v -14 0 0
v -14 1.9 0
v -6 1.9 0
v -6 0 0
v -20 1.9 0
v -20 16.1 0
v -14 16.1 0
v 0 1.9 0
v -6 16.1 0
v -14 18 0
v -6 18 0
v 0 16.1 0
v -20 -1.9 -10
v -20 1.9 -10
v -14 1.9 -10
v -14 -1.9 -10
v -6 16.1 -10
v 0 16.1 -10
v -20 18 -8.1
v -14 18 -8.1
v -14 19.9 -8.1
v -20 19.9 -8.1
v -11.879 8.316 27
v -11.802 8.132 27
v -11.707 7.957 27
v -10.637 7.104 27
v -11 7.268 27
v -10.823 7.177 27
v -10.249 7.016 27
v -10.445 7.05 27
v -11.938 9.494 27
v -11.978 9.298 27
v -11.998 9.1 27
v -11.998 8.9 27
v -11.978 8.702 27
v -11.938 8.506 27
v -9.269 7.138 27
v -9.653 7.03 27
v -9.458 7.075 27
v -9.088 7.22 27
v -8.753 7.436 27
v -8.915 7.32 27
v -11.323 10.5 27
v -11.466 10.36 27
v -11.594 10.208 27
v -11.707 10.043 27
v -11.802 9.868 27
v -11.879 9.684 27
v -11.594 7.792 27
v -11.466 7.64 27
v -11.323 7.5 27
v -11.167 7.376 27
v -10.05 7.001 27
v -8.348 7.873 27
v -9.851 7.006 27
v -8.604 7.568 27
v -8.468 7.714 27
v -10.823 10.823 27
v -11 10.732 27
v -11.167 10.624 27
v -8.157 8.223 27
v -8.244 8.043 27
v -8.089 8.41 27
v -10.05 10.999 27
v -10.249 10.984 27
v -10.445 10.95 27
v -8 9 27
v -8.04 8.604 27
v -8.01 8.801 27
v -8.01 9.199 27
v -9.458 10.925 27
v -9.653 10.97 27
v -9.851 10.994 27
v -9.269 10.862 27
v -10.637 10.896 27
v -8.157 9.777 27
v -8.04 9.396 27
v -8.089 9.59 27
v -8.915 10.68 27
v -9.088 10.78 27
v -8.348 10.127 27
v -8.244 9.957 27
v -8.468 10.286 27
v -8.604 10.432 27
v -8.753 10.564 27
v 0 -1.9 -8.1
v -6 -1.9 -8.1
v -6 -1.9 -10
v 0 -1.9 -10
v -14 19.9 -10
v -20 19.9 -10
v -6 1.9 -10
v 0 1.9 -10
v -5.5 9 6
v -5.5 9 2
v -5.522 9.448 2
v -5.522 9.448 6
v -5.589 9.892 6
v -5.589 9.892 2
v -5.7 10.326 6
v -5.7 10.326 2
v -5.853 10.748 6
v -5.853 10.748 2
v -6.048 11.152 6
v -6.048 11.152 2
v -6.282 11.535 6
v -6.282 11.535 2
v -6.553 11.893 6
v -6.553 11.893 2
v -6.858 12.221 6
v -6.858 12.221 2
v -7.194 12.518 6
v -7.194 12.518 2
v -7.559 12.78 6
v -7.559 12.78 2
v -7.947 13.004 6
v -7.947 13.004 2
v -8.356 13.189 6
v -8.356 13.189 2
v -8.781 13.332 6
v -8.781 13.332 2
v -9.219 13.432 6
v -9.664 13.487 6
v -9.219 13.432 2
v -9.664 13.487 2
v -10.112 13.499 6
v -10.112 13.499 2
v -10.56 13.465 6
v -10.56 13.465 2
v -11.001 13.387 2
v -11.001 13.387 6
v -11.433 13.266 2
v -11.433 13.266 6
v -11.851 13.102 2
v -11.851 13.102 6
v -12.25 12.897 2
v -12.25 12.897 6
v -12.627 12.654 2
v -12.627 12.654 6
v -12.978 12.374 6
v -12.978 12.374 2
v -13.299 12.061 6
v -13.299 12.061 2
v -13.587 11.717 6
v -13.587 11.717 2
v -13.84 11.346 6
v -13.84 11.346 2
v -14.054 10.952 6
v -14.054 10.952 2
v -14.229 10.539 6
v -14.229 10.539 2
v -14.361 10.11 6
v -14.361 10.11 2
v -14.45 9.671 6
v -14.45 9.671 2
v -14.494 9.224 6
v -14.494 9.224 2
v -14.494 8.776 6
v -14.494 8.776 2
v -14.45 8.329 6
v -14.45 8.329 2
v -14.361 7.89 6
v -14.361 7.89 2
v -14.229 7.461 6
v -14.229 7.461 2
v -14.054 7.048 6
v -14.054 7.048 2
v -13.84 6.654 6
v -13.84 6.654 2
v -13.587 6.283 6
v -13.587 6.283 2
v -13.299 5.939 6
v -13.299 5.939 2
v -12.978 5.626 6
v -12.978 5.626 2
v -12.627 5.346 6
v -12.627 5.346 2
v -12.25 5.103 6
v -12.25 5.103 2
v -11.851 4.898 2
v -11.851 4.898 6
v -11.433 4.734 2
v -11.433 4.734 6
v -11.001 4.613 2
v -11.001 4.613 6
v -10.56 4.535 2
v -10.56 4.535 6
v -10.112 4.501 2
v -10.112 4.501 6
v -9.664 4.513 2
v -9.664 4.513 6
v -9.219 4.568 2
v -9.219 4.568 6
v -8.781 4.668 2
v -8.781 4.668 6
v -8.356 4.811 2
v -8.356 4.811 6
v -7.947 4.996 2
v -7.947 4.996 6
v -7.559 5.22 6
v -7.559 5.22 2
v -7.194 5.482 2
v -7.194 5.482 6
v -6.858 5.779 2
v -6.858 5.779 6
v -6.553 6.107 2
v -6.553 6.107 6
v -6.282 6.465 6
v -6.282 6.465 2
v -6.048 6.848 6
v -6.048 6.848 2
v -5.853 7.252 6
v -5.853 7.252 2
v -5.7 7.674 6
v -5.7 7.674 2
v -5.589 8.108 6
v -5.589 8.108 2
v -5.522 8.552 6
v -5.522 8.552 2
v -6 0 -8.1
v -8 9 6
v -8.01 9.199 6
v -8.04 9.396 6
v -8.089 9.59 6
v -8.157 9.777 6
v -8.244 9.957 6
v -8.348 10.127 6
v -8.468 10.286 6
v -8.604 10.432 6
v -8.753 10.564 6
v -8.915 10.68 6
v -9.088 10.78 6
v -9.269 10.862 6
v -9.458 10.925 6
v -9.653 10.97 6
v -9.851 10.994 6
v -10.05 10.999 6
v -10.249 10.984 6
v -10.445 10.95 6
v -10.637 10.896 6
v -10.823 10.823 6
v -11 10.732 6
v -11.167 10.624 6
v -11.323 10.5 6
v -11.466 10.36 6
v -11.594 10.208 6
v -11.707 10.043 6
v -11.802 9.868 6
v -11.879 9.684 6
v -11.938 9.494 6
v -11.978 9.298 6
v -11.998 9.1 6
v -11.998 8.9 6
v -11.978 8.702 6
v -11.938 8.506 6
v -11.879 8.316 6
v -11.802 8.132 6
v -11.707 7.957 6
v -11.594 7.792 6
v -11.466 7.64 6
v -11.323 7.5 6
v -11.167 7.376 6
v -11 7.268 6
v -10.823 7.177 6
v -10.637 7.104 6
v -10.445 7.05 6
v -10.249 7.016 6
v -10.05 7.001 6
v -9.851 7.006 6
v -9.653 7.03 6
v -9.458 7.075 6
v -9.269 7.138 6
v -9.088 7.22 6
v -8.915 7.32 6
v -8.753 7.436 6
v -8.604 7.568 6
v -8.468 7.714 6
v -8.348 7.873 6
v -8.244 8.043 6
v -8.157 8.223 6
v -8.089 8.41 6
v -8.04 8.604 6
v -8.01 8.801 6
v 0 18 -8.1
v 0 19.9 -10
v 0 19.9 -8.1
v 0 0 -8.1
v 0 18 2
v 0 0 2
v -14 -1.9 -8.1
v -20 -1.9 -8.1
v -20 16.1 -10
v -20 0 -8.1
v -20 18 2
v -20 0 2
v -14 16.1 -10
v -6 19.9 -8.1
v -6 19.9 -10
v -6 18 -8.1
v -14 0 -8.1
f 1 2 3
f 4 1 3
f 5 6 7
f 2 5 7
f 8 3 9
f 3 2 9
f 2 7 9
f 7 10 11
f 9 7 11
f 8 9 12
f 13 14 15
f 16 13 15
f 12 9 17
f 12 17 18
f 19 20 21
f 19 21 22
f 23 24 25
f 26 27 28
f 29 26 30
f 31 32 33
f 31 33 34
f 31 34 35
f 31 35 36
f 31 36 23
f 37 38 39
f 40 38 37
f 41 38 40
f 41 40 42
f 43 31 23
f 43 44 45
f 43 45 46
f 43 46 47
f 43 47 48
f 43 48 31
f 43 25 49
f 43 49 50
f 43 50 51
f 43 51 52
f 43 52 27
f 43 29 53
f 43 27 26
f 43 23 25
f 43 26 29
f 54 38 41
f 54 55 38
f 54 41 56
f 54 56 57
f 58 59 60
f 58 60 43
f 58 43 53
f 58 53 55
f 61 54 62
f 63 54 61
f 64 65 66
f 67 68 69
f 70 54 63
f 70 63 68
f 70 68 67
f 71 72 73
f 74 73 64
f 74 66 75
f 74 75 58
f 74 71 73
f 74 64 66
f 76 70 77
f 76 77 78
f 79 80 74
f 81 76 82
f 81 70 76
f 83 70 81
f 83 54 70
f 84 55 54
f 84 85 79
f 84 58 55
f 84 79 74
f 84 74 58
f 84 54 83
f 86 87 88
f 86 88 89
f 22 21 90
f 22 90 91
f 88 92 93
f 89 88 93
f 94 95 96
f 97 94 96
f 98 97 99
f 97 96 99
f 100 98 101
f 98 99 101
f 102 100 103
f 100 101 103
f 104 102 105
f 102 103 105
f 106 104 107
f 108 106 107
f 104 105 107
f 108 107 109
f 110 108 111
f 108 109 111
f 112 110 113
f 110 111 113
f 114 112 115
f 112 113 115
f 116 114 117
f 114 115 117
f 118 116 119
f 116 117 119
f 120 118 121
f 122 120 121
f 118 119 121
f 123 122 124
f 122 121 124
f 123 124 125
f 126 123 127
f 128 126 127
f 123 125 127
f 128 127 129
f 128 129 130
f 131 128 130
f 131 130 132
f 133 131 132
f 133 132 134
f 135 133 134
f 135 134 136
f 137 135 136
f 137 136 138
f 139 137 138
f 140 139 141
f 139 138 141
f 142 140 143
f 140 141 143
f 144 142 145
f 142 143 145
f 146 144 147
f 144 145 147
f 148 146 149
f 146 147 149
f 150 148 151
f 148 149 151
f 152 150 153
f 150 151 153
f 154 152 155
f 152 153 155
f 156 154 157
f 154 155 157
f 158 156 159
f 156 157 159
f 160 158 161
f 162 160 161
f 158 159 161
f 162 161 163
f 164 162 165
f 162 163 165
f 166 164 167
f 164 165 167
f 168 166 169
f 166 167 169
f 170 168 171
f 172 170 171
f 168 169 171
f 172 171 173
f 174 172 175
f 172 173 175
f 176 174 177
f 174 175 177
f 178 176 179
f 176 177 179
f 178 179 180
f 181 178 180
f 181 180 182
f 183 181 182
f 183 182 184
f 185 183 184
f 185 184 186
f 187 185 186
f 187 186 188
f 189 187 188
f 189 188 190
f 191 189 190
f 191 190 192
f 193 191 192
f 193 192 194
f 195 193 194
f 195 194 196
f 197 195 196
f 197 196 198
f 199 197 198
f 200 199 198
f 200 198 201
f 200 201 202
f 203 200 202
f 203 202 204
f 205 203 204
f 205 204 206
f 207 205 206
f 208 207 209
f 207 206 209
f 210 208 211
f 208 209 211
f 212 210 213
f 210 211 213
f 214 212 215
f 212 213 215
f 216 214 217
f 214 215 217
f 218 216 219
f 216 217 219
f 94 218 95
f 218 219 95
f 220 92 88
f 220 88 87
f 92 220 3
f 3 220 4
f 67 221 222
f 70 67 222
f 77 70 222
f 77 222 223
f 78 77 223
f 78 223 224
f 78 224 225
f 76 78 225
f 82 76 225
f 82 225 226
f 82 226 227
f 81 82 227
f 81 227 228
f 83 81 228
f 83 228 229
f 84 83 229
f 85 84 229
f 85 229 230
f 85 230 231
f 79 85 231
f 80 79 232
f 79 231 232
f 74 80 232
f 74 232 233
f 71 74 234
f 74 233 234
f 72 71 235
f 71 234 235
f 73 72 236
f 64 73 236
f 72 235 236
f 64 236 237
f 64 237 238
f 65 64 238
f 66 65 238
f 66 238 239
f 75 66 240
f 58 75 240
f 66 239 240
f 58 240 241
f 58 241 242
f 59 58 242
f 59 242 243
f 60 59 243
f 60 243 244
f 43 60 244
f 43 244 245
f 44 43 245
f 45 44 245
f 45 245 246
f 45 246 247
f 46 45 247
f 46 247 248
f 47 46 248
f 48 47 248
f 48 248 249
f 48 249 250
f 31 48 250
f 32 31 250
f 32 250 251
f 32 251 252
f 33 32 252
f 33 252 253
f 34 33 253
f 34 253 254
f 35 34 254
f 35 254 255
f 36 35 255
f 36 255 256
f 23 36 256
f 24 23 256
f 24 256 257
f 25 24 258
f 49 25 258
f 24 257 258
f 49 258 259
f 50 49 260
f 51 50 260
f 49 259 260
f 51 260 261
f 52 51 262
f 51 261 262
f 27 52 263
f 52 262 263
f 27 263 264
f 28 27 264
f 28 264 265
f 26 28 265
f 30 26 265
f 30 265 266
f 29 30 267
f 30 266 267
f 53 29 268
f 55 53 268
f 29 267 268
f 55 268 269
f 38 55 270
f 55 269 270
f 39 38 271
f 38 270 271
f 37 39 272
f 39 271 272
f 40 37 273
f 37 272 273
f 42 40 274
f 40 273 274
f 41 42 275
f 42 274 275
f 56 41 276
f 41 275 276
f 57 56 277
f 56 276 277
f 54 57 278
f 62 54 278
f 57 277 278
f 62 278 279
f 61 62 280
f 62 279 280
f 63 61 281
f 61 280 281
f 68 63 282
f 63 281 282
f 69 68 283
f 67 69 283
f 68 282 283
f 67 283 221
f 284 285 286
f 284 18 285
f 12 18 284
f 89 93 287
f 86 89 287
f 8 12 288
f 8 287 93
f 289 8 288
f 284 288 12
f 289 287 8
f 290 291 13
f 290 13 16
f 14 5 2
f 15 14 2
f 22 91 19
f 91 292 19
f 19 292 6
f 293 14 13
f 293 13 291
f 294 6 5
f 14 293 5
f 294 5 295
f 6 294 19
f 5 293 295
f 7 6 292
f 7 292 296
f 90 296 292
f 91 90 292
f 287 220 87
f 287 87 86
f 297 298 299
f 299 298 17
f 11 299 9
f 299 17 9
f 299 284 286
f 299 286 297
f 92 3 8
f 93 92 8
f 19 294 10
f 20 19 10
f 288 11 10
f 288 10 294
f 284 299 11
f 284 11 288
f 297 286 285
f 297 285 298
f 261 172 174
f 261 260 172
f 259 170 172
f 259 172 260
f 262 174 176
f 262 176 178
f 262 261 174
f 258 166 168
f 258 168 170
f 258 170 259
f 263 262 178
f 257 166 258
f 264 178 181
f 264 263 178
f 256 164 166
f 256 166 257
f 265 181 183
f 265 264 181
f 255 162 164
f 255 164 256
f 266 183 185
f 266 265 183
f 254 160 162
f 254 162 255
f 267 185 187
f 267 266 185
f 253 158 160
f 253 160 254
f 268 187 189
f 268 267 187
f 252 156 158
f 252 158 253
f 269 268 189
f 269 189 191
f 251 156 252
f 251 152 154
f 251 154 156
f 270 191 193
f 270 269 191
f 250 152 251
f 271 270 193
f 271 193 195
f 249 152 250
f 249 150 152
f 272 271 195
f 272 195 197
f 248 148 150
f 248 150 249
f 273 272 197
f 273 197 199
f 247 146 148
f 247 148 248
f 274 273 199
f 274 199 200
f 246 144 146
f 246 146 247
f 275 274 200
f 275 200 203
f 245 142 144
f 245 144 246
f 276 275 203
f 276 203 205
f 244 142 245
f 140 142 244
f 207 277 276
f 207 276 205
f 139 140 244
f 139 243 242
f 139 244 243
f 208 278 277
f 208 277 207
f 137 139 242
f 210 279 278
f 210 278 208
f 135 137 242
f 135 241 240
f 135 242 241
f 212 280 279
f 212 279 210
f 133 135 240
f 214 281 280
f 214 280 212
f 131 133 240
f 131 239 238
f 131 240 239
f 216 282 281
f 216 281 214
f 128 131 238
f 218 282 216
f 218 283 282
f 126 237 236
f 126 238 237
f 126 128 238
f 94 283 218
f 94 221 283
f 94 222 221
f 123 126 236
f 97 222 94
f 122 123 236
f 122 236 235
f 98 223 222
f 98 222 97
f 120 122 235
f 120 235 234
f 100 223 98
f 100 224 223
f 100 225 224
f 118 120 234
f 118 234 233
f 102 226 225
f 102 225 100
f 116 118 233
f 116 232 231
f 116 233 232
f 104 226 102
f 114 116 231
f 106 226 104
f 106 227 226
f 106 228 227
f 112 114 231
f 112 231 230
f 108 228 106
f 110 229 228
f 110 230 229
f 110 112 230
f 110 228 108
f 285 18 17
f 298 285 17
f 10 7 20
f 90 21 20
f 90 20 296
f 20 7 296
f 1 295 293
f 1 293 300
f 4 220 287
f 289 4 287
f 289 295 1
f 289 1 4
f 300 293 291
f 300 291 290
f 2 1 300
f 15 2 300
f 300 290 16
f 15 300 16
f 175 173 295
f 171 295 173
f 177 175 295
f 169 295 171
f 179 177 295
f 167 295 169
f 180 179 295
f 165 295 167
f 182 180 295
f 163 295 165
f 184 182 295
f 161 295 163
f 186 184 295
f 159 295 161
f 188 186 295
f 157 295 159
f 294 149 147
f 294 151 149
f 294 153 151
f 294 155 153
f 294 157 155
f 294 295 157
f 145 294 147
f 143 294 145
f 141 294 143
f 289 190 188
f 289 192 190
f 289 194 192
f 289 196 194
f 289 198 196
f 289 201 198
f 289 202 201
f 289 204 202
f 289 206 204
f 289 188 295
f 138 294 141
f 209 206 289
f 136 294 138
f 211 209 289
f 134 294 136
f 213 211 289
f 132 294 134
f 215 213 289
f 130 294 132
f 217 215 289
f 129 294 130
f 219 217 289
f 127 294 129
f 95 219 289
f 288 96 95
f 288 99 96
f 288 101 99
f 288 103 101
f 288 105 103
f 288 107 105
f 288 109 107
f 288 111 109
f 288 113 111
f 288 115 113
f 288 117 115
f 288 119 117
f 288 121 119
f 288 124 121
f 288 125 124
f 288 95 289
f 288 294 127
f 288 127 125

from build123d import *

# Parameters (mm, degrees)
F0_W           = 20
F0_H           = 18
F1_DEPTH       = 2
F2_W           = 20
F2_H           = 1.9
F3_DEPTH       = 10
F4_W           = 20
F4_H           = 1.9
F5_DEPTH       = 1.9
F6_W           = 20
F6_H           = 1.9
F7_DEPTH       = 1.9
F8_R           = 4.5
F8_R_2         = 2
F9_DEPTH       = 4
F10_DEPTH      = 25
F11_W          = 8
F11_H          = 8.1
F11_H_2        = 4.5868207008
F12_DEPTH      = 19.901
F12_DEPTH_BACK = 25


with BuildPart() as f1:
    # F0 (on Top) → F1 (new body)
    with BuildSketch(Plane.XY):
        with Locations((-10, 9)):
            Rectangle(F0_W, F0_H)
    extrude(amount=F1_DEPTH)

    # F2 (on face) → F3 (join)
    with BuildSketch(Plane(origin=(0, 0, 0), x_dir=(1, 0, 0), z_dir=(0, 0, -1))):
        with Locations((-10, -0.95)):
            Rectangle(F2_W, F2_H)
        with Locations((-10, -17.05)):
            Rectangle(F2_W, F2_H)
    extrude(amount=F3_DEPTH)

    # F4 (on face) → F5 (join)
    with BuildSketch(Plane.XZ):
        with Locations((-10, -9.05)):
            Rectangle(F4_W, F4_H)
    extrude(amount=F5_DEPTH)

    # F6 (on face) → F7 (join)
    with BuildSketch(Plane(origin=(0, 18, 0), x_dir=(-1, 0, 0), z_dir=(0, 1, 0))):
        with Locations((10, -9.05)):
            Rectangle(F6_W, F6_H)
    extrude(amount=F7_DEPTH)

    # F8 (on face) → F9 (join)
    with BuildSketch(Plane.XY.offset(2)):
        with Locations((-10, 9)):
            Circle(F8_R)
        with Locations((-10, 9)):
            Circle(F8_R_2, mode=Mode.SUBTRACT)
    extrude(amount=F9_DEPTH)

    # F10 (add): a face of the model
    f10_faces = [f1.faces().sort_by_distance(p)[0] for p in [
        (-10, 9, 2),
    ]]
    extrude(f10_faces, amount=F10_DEPTH)

    # F11 (on face) → F12 (cut, two sides)
    with BuildSketch(Plane.XZ) as f12_sk:
        with Locations((-10, -4.05)):
            Rectangle(F11_W, F11_H)
        with Locations((-10, -10.3934103504)):
            Rectangle(F11_W, F11_H_2)
    extrude(amount=-F12_DEPTH, mode=Mode.SUBTRACT)
    extrude(f12_sk.sketch, amount=F12_DEPTH_BACK, mode=Mode.SUBTRACT)


solid = f1.part
